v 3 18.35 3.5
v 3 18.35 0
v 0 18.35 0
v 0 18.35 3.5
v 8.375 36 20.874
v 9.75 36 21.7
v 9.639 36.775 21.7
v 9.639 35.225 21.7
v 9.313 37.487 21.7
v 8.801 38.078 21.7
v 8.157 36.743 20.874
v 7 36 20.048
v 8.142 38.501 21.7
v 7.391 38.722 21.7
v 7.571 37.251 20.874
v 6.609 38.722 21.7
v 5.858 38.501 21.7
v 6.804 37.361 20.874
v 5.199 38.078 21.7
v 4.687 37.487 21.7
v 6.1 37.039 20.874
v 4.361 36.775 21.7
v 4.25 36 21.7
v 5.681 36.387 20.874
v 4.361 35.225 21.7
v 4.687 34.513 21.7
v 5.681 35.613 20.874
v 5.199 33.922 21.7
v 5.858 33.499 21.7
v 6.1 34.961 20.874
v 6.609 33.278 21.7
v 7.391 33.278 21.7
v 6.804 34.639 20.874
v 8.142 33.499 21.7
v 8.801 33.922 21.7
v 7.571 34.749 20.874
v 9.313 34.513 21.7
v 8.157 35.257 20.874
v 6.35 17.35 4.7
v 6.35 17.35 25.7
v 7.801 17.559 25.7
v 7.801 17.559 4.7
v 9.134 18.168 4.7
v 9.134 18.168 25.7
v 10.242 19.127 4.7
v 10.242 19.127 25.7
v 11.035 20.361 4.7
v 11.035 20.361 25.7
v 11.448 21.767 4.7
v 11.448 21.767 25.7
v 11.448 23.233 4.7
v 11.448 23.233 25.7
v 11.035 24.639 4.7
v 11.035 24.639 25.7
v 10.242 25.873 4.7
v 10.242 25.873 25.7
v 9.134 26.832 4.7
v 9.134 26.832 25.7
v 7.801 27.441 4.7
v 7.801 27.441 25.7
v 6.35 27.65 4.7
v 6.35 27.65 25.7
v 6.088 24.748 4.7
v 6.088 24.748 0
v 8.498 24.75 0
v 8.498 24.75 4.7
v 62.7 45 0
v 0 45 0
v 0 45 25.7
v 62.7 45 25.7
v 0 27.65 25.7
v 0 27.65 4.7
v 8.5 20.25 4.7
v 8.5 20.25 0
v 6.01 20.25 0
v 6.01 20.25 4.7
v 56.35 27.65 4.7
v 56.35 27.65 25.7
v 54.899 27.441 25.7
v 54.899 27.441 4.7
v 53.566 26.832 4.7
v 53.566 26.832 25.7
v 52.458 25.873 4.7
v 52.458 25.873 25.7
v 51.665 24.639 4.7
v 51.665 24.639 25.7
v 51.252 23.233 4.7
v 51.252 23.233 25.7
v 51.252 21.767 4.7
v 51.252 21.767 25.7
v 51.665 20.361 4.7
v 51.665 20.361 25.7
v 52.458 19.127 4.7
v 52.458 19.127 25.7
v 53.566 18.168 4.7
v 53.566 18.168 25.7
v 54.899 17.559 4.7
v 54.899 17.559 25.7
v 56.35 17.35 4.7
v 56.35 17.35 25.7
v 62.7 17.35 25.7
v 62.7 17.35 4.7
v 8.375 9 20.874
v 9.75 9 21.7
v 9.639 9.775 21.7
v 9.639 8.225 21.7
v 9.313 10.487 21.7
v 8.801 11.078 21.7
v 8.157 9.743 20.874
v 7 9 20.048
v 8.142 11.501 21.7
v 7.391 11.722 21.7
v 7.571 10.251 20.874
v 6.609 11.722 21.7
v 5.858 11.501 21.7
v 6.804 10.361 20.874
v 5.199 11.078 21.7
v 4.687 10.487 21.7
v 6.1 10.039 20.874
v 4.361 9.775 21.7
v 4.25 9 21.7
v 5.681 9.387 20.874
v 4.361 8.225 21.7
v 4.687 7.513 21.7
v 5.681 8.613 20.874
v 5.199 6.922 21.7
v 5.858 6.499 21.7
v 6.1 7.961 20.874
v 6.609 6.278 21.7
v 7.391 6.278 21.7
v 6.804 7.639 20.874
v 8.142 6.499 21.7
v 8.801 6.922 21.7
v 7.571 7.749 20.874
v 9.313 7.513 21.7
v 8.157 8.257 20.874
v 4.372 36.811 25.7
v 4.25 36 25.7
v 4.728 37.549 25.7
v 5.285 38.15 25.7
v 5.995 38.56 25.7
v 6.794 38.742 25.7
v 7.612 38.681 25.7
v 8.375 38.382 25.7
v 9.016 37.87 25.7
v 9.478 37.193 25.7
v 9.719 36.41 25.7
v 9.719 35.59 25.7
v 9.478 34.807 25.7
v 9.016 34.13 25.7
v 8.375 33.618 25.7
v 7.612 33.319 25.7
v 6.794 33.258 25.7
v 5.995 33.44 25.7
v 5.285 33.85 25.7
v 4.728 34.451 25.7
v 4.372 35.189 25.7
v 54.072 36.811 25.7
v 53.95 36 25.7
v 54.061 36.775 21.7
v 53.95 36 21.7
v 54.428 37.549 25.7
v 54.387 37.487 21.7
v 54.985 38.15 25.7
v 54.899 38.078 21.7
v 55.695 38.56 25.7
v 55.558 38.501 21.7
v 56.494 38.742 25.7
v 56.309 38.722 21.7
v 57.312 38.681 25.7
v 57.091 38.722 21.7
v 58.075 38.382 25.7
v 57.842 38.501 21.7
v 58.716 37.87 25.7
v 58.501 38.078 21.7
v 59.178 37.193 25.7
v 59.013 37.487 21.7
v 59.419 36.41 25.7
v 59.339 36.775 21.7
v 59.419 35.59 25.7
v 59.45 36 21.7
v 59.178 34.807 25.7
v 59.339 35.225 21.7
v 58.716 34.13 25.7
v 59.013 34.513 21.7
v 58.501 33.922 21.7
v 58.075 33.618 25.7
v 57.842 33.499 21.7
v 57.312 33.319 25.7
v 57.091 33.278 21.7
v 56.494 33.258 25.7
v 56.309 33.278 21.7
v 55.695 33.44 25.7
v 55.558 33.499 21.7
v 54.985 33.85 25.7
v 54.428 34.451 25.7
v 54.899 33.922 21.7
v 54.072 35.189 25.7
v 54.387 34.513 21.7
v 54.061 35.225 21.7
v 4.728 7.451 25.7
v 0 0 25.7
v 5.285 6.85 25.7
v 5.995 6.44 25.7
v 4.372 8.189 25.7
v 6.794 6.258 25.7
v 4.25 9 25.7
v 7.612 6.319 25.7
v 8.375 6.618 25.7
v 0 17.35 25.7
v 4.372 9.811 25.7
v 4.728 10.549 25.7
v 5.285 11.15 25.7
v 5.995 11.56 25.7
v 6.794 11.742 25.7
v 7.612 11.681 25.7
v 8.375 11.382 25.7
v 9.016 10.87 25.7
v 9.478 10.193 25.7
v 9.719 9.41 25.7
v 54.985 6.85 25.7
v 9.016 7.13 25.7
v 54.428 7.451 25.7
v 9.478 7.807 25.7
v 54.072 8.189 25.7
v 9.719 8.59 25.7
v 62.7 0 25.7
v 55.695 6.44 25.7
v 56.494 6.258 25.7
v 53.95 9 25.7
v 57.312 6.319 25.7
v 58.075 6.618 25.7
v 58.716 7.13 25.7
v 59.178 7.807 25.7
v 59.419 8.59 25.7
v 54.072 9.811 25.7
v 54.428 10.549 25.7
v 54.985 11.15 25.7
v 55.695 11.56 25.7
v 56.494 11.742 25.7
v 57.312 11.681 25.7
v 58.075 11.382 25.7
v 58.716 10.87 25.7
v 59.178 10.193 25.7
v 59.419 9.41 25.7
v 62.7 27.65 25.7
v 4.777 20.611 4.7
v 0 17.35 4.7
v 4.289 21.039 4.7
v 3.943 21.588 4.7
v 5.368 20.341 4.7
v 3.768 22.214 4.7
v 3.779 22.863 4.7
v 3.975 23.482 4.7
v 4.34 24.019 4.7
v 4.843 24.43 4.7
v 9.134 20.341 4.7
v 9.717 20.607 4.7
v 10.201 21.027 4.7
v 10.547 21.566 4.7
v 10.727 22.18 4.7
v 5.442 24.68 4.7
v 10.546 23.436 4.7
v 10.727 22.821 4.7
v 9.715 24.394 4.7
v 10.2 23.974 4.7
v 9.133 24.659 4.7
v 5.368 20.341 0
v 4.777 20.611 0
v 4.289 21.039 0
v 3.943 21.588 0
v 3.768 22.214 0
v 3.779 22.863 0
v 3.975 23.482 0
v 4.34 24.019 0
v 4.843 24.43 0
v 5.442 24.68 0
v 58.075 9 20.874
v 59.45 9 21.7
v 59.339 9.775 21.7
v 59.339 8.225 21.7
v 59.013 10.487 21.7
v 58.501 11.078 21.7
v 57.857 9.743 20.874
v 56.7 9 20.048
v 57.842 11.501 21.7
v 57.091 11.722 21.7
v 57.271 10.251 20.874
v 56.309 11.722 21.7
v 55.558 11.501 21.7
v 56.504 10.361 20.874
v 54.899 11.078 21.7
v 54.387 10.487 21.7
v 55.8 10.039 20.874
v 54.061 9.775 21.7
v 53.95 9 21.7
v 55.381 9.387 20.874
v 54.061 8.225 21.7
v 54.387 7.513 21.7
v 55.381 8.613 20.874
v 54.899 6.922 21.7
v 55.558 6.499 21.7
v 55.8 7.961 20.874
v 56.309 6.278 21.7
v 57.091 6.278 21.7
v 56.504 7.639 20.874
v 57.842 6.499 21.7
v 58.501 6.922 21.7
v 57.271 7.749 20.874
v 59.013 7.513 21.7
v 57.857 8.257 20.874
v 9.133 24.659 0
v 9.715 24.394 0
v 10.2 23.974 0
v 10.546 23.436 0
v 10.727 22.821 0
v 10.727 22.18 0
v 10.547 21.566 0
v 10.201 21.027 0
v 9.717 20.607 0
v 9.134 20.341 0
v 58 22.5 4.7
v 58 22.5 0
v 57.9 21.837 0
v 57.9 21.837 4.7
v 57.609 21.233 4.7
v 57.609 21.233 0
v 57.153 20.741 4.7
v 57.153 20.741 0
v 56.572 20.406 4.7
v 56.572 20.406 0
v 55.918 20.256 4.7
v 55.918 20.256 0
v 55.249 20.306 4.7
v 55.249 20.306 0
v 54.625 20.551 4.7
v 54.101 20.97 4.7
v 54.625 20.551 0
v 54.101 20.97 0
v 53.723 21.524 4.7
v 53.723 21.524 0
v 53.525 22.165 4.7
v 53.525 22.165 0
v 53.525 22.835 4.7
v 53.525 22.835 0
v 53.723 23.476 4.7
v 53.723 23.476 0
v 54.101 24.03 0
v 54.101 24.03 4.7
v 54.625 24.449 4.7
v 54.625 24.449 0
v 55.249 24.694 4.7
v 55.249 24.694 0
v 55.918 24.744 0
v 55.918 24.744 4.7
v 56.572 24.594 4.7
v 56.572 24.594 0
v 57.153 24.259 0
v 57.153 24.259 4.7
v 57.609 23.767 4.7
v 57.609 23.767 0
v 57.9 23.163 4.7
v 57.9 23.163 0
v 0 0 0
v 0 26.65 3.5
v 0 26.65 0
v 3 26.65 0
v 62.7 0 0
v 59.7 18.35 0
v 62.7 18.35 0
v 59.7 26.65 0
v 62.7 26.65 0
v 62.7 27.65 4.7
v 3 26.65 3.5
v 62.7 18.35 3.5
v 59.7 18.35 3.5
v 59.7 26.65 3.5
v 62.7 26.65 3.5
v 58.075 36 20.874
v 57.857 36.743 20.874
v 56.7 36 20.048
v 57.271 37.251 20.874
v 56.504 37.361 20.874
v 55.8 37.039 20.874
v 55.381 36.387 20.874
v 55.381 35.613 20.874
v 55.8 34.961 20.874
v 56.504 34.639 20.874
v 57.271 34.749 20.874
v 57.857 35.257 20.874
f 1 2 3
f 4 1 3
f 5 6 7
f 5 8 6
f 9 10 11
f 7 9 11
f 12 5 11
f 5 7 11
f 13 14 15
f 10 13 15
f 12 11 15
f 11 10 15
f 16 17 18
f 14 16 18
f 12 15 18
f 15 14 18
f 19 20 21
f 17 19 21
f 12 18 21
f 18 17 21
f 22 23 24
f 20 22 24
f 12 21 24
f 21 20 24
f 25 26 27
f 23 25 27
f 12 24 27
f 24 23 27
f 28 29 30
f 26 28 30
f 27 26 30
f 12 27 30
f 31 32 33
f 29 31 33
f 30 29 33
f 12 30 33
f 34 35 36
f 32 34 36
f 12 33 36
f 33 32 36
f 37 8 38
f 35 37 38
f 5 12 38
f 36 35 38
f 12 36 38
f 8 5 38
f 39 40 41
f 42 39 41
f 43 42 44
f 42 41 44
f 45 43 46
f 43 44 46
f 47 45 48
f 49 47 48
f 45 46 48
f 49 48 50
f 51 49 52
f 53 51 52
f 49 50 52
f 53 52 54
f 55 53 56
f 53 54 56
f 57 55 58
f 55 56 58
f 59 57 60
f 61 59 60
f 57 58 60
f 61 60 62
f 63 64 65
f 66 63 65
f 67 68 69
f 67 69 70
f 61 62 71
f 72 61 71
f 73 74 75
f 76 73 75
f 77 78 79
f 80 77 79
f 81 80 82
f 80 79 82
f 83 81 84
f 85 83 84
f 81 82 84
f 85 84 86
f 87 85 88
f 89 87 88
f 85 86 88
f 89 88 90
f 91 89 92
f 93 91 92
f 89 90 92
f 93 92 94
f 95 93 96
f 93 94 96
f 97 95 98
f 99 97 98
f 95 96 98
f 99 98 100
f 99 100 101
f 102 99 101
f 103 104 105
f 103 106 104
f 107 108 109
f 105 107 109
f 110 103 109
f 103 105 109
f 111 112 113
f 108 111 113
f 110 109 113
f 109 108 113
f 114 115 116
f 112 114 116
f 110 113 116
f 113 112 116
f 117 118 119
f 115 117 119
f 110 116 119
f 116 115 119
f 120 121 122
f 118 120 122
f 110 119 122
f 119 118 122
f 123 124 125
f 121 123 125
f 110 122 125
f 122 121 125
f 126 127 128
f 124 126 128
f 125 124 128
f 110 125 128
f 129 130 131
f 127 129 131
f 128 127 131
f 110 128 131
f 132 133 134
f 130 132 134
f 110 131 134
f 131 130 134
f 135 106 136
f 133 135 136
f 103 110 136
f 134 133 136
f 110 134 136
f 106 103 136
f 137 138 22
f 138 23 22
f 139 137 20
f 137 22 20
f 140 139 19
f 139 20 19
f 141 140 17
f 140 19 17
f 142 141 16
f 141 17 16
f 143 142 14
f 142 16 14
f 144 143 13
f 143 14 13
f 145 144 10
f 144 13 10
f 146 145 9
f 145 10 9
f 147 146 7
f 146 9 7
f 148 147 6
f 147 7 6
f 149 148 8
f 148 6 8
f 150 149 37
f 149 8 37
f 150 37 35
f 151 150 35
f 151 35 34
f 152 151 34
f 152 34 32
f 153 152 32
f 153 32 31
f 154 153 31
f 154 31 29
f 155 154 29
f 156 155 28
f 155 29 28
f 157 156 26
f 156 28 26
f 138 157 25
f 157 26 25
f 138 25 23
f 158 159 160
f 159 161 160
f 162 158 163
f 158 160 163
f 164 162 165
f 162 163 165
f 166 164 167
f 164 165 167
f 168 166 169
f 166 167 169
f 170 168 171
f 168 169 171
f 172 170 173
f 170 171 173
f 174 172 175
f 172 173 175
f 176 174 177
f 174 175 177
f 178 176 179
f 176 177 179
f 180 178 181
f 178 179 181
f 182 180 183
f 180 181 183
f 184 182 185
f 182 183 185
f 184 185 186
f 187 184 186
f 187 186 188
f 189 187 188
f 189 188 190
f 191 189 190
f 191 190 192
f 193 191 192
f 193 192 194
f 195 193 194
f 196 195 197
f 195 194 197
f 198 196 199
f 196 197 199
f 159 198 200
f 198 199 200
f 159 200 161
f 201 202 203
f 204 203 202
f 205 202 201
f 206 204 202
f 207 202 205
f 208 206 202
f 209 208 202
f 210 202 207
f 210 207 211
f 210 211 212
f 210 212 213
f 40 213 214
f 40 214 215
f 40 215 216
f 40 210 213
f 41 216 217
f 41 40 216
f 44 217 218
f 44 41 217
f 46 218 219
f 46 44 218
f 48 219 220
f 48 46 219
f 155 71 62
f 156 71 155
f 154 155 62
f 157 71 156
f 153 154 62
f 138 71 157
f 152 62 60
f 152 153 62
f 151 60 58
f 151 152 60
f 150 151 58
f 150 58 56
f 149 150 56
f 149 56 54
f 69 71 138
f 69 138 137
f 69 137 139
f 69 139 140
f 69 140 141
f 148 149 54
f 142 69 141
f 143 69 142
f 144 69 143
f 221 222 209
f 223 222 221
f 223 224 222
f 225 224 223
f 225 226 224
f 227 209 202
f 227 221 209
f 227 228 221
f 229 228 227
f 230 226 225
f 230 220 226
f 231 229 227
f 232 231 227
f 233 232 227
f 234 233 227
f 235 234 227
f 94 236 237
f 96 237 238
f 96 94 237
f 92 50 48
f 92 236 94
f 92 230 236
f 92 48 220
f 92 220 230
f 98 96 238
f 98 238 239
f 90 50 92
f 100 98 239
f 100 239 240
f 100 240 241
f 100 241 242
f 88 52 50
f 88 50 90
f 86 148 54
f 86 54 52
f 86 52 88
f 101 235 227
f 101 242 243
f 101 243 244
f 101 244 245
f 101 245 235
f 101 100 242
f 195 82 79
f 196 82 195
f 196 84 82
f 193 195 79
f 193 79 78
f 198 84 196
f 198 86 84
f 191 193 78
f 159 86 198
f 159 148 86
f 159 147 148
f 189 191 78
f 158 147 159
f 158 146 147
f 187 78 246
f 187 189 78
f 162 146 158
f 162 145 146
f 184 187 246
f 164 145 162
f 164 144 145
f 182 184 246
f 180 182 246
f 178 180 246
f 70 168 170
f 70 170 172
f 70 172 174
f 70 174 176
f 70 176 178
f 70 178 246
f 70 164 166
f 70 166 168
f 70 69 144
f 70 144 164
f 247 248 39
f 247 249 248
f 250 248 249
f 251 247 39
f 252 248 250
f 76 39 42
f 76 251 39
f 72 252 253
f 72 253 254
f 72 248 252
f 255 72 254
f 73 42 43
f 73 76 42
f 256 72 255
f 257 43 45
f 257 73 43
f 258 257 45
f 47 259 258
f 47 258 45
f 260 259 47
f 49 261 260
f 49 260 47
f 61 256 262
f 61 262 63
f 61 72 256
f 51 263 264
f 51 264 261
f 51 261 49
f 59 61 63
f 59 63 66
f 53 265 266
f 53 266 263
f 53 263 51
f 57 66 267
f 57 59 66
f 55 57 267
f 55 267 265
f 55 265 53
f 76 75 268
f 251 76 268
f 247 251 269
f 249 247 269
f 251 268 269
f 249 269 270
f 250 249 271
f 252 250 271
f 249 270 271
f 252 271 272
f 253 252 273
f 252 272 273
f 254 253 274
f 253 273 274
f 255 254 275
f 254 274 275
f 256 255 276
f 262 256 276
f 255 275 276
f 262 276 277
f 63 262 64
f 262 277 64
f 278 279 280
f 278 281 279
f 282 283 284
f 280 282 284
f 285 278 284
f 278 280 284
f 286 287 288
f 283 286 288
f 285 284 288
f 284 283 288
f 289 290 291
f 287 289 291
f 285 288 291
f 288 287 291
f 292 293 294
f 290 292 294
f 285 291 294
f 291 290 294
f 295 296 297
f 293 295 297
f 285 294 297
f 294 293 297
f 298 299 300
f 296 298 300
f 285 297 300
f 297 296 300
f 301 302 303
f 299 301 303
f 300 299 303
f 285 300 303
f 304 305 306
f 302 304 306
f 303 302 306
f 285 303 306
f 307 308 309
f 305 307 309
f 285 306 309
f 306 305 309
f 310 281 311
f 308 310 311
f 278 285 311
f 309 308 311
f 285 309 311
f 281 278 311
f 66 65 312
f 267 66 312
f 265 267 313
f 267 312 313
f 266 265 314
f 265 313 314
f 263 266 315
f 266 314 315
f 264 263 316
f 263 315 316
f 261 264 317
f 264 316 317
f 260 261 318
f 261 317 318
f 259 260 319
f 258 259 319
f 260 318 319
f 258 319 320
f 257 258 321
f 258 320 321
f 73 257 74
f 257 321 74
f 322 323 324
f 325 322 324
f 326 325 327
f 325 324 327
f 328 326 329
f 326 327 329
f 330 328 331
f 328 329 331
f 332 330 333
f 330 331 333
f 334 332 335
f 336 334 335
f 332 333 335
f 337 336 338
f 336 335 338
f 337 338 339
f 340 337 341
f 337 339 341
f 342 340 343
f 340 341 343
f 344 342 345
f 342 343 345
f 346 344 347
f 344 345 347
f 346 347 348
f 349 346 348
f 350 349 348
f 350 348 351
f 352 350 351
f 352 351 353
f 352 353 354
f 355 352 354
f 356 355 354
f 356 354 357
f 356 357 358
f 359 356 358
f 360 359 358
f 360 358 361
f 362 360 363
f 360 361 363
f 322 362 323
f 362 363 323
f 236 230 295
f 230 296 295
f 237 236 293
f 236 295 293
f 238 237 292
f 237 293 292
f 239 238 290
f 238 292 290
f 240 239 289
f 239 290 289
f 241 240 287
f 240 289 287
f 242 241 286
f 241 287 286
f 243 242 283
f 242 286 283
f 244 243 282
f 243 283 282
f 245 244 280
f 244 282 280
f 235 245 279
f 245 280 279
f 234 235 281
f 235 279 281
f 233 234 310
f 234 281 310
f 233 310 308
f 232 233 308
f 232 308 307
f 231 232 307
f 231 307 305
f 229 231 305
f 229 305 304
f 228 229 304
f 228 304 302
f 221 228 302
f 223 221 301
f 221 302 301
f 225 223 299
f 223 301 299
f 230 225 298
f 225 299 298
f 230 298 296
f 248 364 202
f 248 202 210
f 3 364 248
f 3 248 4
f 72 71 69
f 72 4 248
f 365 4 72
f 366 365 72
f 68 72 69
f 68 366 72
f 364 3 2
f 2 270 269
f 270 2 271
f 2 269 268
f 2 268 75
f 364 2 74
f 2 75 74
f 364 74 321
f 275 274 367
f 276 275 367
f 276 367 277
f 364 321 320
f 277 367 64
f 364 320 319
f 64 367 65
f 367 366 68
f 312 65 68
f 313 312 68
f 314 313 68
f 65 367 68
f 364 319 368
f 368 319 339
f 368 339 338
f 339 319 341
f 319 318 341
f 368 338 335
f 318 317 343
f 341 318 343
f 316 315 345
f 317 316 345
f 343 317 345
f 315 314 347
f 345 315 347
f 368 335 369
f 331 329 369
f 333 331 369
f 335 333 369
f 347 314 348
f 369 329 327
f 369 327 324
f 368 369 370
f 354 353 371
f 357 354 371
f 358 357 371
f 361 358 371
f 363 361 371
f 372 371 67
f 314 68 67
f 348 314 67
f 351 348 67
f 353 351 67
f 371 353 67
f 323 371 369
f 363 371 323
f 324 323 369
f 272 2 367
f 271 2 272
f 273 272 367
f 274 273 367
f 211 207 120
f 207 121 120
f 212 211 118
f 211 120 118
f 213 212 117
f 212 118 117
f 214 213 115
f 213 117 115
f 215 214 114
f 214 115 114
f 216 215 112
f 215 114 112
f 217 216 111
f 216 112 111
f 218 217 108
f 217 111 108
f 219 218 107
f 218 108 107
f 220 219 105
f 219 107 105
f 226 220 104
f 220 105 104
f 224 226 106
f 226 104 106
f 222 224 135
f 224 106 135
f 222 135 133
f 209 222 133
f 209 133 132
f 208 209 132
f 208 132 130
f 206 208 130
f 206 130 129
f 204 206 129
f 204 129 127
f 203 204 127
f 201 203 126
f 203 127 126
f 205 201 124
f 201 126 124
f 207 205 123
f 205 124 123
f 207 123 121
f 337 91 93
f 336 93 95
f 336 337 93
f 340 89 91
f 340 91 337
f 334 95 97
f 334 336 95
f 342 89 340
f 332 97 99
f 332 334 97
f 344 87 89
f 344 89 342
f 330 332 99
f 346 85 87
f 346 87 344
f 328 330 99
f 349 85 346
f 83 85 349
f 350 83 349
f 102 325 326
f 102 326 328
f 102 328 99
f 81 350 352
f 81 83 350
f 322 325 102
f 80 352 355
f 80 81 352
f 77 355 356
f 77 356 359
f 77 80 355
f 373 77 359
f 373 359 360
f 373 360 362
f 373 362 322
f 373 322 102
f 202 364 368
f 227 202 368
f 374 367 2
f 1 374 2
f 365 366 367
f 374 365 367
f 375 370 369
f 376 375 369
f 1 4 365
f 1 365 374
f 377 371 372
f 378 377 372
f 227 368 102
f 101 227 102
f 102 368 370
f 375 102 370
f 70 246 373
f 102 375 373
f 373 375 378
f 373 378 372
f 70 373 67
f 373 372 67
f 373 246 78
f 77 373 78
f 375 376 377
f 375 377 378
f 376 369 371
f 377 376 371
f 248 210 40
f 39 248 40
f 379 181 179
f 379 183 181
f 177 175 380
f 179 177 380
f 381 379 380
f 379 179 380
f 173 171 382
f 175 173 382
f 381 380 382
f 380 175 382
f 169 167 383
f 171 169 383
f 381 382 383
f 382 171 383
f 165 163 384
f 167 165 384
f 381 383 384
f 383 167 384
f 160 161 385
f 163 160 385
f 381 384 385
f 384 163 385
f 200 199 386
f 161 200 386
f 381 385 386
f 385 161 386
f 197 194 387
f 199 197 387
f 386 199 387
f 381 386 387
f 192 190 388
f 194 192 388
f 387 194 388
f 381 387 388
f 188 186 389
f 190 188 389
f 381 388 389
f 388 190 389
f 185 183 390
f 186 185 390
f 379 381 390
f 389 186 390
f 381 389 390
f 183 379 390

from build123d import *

# Parameters (mm, degrees)
F0_W     = 62.7
F0_H     = 45
F1_DEPTH = 25.7
F3_DEPTH = 3.5
F5_DEPTH = 21
F6_R     = 2.25
F7_DEPTH = 4.7
F9_D     = 5.5
F9_DEPTH = 4
F9_TIP   = 1.6523667023


with BuildPart() as f1:
    # F0 (on Top) → F1 (new body)
    with BuildSketch(Plane.XY):
        with Locations((31.35, 22.5)):
            Rectangle(F0_W, F0_H)
    extrude(amount=F1_DEPTH)

    # F2 (on face) → F3 (cut)
    with BuildSketch(Plane(origin=(0, 0, 0), x_dir=(1, 0, 0), z_dir=(0, 0, -1))):
        Polygon((0, -18.35), (0, -22.5), (0, -26.65), (3, -26.65), (3, -22.5), (3, -18.35), align=None)
        Polygon((62.7, -22.5), (62.7, -18.35), (59.7, -18.35), (59.7, -22.5), (59.7, -26.65), (62.7, -26.65), align=None)
    extrude(amount=-F3_DEPTH, mode=Mode.SUBTRACT)

    # F4 (on face) → F5 (cut)
    with BuildSketch(Plane.XY.offset(25.7)):
        with BuildLine():
            Line((0, 27.65), (0, 22.5))
            Line((0, 22.5), (0, 17.35))
            Line((0, 17.35), (6.35, 17.35))
            ThreePointArc((6.35, 17.35), (11.5, 22.5), (6.35, 27.65))
            Line((6.35, 27.65), (0, 27.65))
        make_face()
        with BuildLine():
            ThreePointArc((56.35, 27.65), (51.2, 22.5), (56.35, 17.35))
            Line((56.35, 17.35), (62.7, 17.35))
            Line((62.7, 17.35), (62.7, 22.5))
            Line((62.7, 22.5), (62.7, 27.65))
            Line((62.7, 27.65), (56.35, 27.65))
        make_face()
    extrude(amount=-F5_DEPTH, mode=Mode.SUBTRACT)

    # F6 (on face) → F7 (cut, through all)
    with BuildSketch(Plane(origin=(0, 0, 0), x_dir=(1, 0, 0), z_dir=(0, 0, -1))):
        with Locations((55.75, -22.5)):
            Circle(F6_R)
        with BuildLine():
            Line((8.4999779246, -20.2500000001), (6.0104839369, -20.2500244252))
            ThreePointArc((6.0104839369, -20.2500244252), (3.750330021, -22.5385355083), (6.087536662, -24.7482965402))
            Line((6.087536662, -24.7482965402), (8.4984107338, -24.7499994387))
            ThreePointArc((8.4984107338, -24.7499994387), (10.7499998636, -22.5007835955), (8.4999779246, -20.2500000001))
        make_face()
    extrude(amount=-F7_DEPTH, mode=Mode.SUBTRACT)

    # F9
    with Locations(Plane.XY.offset(25.7)):
        with Locations((7, 36), (7, 9), (56.7, 9), (56.7, 36)):
            Hole(F9_D / 2, depth=F9_DEPTH)
            with Locations((0, 0, -(F9_DEPTH + F9_TIP / 2))):  # 118° drill point
                Cone(0, F9_D / 2, F9_TIP, mode=Mode.SUBTRACT)


solid = f1.part
